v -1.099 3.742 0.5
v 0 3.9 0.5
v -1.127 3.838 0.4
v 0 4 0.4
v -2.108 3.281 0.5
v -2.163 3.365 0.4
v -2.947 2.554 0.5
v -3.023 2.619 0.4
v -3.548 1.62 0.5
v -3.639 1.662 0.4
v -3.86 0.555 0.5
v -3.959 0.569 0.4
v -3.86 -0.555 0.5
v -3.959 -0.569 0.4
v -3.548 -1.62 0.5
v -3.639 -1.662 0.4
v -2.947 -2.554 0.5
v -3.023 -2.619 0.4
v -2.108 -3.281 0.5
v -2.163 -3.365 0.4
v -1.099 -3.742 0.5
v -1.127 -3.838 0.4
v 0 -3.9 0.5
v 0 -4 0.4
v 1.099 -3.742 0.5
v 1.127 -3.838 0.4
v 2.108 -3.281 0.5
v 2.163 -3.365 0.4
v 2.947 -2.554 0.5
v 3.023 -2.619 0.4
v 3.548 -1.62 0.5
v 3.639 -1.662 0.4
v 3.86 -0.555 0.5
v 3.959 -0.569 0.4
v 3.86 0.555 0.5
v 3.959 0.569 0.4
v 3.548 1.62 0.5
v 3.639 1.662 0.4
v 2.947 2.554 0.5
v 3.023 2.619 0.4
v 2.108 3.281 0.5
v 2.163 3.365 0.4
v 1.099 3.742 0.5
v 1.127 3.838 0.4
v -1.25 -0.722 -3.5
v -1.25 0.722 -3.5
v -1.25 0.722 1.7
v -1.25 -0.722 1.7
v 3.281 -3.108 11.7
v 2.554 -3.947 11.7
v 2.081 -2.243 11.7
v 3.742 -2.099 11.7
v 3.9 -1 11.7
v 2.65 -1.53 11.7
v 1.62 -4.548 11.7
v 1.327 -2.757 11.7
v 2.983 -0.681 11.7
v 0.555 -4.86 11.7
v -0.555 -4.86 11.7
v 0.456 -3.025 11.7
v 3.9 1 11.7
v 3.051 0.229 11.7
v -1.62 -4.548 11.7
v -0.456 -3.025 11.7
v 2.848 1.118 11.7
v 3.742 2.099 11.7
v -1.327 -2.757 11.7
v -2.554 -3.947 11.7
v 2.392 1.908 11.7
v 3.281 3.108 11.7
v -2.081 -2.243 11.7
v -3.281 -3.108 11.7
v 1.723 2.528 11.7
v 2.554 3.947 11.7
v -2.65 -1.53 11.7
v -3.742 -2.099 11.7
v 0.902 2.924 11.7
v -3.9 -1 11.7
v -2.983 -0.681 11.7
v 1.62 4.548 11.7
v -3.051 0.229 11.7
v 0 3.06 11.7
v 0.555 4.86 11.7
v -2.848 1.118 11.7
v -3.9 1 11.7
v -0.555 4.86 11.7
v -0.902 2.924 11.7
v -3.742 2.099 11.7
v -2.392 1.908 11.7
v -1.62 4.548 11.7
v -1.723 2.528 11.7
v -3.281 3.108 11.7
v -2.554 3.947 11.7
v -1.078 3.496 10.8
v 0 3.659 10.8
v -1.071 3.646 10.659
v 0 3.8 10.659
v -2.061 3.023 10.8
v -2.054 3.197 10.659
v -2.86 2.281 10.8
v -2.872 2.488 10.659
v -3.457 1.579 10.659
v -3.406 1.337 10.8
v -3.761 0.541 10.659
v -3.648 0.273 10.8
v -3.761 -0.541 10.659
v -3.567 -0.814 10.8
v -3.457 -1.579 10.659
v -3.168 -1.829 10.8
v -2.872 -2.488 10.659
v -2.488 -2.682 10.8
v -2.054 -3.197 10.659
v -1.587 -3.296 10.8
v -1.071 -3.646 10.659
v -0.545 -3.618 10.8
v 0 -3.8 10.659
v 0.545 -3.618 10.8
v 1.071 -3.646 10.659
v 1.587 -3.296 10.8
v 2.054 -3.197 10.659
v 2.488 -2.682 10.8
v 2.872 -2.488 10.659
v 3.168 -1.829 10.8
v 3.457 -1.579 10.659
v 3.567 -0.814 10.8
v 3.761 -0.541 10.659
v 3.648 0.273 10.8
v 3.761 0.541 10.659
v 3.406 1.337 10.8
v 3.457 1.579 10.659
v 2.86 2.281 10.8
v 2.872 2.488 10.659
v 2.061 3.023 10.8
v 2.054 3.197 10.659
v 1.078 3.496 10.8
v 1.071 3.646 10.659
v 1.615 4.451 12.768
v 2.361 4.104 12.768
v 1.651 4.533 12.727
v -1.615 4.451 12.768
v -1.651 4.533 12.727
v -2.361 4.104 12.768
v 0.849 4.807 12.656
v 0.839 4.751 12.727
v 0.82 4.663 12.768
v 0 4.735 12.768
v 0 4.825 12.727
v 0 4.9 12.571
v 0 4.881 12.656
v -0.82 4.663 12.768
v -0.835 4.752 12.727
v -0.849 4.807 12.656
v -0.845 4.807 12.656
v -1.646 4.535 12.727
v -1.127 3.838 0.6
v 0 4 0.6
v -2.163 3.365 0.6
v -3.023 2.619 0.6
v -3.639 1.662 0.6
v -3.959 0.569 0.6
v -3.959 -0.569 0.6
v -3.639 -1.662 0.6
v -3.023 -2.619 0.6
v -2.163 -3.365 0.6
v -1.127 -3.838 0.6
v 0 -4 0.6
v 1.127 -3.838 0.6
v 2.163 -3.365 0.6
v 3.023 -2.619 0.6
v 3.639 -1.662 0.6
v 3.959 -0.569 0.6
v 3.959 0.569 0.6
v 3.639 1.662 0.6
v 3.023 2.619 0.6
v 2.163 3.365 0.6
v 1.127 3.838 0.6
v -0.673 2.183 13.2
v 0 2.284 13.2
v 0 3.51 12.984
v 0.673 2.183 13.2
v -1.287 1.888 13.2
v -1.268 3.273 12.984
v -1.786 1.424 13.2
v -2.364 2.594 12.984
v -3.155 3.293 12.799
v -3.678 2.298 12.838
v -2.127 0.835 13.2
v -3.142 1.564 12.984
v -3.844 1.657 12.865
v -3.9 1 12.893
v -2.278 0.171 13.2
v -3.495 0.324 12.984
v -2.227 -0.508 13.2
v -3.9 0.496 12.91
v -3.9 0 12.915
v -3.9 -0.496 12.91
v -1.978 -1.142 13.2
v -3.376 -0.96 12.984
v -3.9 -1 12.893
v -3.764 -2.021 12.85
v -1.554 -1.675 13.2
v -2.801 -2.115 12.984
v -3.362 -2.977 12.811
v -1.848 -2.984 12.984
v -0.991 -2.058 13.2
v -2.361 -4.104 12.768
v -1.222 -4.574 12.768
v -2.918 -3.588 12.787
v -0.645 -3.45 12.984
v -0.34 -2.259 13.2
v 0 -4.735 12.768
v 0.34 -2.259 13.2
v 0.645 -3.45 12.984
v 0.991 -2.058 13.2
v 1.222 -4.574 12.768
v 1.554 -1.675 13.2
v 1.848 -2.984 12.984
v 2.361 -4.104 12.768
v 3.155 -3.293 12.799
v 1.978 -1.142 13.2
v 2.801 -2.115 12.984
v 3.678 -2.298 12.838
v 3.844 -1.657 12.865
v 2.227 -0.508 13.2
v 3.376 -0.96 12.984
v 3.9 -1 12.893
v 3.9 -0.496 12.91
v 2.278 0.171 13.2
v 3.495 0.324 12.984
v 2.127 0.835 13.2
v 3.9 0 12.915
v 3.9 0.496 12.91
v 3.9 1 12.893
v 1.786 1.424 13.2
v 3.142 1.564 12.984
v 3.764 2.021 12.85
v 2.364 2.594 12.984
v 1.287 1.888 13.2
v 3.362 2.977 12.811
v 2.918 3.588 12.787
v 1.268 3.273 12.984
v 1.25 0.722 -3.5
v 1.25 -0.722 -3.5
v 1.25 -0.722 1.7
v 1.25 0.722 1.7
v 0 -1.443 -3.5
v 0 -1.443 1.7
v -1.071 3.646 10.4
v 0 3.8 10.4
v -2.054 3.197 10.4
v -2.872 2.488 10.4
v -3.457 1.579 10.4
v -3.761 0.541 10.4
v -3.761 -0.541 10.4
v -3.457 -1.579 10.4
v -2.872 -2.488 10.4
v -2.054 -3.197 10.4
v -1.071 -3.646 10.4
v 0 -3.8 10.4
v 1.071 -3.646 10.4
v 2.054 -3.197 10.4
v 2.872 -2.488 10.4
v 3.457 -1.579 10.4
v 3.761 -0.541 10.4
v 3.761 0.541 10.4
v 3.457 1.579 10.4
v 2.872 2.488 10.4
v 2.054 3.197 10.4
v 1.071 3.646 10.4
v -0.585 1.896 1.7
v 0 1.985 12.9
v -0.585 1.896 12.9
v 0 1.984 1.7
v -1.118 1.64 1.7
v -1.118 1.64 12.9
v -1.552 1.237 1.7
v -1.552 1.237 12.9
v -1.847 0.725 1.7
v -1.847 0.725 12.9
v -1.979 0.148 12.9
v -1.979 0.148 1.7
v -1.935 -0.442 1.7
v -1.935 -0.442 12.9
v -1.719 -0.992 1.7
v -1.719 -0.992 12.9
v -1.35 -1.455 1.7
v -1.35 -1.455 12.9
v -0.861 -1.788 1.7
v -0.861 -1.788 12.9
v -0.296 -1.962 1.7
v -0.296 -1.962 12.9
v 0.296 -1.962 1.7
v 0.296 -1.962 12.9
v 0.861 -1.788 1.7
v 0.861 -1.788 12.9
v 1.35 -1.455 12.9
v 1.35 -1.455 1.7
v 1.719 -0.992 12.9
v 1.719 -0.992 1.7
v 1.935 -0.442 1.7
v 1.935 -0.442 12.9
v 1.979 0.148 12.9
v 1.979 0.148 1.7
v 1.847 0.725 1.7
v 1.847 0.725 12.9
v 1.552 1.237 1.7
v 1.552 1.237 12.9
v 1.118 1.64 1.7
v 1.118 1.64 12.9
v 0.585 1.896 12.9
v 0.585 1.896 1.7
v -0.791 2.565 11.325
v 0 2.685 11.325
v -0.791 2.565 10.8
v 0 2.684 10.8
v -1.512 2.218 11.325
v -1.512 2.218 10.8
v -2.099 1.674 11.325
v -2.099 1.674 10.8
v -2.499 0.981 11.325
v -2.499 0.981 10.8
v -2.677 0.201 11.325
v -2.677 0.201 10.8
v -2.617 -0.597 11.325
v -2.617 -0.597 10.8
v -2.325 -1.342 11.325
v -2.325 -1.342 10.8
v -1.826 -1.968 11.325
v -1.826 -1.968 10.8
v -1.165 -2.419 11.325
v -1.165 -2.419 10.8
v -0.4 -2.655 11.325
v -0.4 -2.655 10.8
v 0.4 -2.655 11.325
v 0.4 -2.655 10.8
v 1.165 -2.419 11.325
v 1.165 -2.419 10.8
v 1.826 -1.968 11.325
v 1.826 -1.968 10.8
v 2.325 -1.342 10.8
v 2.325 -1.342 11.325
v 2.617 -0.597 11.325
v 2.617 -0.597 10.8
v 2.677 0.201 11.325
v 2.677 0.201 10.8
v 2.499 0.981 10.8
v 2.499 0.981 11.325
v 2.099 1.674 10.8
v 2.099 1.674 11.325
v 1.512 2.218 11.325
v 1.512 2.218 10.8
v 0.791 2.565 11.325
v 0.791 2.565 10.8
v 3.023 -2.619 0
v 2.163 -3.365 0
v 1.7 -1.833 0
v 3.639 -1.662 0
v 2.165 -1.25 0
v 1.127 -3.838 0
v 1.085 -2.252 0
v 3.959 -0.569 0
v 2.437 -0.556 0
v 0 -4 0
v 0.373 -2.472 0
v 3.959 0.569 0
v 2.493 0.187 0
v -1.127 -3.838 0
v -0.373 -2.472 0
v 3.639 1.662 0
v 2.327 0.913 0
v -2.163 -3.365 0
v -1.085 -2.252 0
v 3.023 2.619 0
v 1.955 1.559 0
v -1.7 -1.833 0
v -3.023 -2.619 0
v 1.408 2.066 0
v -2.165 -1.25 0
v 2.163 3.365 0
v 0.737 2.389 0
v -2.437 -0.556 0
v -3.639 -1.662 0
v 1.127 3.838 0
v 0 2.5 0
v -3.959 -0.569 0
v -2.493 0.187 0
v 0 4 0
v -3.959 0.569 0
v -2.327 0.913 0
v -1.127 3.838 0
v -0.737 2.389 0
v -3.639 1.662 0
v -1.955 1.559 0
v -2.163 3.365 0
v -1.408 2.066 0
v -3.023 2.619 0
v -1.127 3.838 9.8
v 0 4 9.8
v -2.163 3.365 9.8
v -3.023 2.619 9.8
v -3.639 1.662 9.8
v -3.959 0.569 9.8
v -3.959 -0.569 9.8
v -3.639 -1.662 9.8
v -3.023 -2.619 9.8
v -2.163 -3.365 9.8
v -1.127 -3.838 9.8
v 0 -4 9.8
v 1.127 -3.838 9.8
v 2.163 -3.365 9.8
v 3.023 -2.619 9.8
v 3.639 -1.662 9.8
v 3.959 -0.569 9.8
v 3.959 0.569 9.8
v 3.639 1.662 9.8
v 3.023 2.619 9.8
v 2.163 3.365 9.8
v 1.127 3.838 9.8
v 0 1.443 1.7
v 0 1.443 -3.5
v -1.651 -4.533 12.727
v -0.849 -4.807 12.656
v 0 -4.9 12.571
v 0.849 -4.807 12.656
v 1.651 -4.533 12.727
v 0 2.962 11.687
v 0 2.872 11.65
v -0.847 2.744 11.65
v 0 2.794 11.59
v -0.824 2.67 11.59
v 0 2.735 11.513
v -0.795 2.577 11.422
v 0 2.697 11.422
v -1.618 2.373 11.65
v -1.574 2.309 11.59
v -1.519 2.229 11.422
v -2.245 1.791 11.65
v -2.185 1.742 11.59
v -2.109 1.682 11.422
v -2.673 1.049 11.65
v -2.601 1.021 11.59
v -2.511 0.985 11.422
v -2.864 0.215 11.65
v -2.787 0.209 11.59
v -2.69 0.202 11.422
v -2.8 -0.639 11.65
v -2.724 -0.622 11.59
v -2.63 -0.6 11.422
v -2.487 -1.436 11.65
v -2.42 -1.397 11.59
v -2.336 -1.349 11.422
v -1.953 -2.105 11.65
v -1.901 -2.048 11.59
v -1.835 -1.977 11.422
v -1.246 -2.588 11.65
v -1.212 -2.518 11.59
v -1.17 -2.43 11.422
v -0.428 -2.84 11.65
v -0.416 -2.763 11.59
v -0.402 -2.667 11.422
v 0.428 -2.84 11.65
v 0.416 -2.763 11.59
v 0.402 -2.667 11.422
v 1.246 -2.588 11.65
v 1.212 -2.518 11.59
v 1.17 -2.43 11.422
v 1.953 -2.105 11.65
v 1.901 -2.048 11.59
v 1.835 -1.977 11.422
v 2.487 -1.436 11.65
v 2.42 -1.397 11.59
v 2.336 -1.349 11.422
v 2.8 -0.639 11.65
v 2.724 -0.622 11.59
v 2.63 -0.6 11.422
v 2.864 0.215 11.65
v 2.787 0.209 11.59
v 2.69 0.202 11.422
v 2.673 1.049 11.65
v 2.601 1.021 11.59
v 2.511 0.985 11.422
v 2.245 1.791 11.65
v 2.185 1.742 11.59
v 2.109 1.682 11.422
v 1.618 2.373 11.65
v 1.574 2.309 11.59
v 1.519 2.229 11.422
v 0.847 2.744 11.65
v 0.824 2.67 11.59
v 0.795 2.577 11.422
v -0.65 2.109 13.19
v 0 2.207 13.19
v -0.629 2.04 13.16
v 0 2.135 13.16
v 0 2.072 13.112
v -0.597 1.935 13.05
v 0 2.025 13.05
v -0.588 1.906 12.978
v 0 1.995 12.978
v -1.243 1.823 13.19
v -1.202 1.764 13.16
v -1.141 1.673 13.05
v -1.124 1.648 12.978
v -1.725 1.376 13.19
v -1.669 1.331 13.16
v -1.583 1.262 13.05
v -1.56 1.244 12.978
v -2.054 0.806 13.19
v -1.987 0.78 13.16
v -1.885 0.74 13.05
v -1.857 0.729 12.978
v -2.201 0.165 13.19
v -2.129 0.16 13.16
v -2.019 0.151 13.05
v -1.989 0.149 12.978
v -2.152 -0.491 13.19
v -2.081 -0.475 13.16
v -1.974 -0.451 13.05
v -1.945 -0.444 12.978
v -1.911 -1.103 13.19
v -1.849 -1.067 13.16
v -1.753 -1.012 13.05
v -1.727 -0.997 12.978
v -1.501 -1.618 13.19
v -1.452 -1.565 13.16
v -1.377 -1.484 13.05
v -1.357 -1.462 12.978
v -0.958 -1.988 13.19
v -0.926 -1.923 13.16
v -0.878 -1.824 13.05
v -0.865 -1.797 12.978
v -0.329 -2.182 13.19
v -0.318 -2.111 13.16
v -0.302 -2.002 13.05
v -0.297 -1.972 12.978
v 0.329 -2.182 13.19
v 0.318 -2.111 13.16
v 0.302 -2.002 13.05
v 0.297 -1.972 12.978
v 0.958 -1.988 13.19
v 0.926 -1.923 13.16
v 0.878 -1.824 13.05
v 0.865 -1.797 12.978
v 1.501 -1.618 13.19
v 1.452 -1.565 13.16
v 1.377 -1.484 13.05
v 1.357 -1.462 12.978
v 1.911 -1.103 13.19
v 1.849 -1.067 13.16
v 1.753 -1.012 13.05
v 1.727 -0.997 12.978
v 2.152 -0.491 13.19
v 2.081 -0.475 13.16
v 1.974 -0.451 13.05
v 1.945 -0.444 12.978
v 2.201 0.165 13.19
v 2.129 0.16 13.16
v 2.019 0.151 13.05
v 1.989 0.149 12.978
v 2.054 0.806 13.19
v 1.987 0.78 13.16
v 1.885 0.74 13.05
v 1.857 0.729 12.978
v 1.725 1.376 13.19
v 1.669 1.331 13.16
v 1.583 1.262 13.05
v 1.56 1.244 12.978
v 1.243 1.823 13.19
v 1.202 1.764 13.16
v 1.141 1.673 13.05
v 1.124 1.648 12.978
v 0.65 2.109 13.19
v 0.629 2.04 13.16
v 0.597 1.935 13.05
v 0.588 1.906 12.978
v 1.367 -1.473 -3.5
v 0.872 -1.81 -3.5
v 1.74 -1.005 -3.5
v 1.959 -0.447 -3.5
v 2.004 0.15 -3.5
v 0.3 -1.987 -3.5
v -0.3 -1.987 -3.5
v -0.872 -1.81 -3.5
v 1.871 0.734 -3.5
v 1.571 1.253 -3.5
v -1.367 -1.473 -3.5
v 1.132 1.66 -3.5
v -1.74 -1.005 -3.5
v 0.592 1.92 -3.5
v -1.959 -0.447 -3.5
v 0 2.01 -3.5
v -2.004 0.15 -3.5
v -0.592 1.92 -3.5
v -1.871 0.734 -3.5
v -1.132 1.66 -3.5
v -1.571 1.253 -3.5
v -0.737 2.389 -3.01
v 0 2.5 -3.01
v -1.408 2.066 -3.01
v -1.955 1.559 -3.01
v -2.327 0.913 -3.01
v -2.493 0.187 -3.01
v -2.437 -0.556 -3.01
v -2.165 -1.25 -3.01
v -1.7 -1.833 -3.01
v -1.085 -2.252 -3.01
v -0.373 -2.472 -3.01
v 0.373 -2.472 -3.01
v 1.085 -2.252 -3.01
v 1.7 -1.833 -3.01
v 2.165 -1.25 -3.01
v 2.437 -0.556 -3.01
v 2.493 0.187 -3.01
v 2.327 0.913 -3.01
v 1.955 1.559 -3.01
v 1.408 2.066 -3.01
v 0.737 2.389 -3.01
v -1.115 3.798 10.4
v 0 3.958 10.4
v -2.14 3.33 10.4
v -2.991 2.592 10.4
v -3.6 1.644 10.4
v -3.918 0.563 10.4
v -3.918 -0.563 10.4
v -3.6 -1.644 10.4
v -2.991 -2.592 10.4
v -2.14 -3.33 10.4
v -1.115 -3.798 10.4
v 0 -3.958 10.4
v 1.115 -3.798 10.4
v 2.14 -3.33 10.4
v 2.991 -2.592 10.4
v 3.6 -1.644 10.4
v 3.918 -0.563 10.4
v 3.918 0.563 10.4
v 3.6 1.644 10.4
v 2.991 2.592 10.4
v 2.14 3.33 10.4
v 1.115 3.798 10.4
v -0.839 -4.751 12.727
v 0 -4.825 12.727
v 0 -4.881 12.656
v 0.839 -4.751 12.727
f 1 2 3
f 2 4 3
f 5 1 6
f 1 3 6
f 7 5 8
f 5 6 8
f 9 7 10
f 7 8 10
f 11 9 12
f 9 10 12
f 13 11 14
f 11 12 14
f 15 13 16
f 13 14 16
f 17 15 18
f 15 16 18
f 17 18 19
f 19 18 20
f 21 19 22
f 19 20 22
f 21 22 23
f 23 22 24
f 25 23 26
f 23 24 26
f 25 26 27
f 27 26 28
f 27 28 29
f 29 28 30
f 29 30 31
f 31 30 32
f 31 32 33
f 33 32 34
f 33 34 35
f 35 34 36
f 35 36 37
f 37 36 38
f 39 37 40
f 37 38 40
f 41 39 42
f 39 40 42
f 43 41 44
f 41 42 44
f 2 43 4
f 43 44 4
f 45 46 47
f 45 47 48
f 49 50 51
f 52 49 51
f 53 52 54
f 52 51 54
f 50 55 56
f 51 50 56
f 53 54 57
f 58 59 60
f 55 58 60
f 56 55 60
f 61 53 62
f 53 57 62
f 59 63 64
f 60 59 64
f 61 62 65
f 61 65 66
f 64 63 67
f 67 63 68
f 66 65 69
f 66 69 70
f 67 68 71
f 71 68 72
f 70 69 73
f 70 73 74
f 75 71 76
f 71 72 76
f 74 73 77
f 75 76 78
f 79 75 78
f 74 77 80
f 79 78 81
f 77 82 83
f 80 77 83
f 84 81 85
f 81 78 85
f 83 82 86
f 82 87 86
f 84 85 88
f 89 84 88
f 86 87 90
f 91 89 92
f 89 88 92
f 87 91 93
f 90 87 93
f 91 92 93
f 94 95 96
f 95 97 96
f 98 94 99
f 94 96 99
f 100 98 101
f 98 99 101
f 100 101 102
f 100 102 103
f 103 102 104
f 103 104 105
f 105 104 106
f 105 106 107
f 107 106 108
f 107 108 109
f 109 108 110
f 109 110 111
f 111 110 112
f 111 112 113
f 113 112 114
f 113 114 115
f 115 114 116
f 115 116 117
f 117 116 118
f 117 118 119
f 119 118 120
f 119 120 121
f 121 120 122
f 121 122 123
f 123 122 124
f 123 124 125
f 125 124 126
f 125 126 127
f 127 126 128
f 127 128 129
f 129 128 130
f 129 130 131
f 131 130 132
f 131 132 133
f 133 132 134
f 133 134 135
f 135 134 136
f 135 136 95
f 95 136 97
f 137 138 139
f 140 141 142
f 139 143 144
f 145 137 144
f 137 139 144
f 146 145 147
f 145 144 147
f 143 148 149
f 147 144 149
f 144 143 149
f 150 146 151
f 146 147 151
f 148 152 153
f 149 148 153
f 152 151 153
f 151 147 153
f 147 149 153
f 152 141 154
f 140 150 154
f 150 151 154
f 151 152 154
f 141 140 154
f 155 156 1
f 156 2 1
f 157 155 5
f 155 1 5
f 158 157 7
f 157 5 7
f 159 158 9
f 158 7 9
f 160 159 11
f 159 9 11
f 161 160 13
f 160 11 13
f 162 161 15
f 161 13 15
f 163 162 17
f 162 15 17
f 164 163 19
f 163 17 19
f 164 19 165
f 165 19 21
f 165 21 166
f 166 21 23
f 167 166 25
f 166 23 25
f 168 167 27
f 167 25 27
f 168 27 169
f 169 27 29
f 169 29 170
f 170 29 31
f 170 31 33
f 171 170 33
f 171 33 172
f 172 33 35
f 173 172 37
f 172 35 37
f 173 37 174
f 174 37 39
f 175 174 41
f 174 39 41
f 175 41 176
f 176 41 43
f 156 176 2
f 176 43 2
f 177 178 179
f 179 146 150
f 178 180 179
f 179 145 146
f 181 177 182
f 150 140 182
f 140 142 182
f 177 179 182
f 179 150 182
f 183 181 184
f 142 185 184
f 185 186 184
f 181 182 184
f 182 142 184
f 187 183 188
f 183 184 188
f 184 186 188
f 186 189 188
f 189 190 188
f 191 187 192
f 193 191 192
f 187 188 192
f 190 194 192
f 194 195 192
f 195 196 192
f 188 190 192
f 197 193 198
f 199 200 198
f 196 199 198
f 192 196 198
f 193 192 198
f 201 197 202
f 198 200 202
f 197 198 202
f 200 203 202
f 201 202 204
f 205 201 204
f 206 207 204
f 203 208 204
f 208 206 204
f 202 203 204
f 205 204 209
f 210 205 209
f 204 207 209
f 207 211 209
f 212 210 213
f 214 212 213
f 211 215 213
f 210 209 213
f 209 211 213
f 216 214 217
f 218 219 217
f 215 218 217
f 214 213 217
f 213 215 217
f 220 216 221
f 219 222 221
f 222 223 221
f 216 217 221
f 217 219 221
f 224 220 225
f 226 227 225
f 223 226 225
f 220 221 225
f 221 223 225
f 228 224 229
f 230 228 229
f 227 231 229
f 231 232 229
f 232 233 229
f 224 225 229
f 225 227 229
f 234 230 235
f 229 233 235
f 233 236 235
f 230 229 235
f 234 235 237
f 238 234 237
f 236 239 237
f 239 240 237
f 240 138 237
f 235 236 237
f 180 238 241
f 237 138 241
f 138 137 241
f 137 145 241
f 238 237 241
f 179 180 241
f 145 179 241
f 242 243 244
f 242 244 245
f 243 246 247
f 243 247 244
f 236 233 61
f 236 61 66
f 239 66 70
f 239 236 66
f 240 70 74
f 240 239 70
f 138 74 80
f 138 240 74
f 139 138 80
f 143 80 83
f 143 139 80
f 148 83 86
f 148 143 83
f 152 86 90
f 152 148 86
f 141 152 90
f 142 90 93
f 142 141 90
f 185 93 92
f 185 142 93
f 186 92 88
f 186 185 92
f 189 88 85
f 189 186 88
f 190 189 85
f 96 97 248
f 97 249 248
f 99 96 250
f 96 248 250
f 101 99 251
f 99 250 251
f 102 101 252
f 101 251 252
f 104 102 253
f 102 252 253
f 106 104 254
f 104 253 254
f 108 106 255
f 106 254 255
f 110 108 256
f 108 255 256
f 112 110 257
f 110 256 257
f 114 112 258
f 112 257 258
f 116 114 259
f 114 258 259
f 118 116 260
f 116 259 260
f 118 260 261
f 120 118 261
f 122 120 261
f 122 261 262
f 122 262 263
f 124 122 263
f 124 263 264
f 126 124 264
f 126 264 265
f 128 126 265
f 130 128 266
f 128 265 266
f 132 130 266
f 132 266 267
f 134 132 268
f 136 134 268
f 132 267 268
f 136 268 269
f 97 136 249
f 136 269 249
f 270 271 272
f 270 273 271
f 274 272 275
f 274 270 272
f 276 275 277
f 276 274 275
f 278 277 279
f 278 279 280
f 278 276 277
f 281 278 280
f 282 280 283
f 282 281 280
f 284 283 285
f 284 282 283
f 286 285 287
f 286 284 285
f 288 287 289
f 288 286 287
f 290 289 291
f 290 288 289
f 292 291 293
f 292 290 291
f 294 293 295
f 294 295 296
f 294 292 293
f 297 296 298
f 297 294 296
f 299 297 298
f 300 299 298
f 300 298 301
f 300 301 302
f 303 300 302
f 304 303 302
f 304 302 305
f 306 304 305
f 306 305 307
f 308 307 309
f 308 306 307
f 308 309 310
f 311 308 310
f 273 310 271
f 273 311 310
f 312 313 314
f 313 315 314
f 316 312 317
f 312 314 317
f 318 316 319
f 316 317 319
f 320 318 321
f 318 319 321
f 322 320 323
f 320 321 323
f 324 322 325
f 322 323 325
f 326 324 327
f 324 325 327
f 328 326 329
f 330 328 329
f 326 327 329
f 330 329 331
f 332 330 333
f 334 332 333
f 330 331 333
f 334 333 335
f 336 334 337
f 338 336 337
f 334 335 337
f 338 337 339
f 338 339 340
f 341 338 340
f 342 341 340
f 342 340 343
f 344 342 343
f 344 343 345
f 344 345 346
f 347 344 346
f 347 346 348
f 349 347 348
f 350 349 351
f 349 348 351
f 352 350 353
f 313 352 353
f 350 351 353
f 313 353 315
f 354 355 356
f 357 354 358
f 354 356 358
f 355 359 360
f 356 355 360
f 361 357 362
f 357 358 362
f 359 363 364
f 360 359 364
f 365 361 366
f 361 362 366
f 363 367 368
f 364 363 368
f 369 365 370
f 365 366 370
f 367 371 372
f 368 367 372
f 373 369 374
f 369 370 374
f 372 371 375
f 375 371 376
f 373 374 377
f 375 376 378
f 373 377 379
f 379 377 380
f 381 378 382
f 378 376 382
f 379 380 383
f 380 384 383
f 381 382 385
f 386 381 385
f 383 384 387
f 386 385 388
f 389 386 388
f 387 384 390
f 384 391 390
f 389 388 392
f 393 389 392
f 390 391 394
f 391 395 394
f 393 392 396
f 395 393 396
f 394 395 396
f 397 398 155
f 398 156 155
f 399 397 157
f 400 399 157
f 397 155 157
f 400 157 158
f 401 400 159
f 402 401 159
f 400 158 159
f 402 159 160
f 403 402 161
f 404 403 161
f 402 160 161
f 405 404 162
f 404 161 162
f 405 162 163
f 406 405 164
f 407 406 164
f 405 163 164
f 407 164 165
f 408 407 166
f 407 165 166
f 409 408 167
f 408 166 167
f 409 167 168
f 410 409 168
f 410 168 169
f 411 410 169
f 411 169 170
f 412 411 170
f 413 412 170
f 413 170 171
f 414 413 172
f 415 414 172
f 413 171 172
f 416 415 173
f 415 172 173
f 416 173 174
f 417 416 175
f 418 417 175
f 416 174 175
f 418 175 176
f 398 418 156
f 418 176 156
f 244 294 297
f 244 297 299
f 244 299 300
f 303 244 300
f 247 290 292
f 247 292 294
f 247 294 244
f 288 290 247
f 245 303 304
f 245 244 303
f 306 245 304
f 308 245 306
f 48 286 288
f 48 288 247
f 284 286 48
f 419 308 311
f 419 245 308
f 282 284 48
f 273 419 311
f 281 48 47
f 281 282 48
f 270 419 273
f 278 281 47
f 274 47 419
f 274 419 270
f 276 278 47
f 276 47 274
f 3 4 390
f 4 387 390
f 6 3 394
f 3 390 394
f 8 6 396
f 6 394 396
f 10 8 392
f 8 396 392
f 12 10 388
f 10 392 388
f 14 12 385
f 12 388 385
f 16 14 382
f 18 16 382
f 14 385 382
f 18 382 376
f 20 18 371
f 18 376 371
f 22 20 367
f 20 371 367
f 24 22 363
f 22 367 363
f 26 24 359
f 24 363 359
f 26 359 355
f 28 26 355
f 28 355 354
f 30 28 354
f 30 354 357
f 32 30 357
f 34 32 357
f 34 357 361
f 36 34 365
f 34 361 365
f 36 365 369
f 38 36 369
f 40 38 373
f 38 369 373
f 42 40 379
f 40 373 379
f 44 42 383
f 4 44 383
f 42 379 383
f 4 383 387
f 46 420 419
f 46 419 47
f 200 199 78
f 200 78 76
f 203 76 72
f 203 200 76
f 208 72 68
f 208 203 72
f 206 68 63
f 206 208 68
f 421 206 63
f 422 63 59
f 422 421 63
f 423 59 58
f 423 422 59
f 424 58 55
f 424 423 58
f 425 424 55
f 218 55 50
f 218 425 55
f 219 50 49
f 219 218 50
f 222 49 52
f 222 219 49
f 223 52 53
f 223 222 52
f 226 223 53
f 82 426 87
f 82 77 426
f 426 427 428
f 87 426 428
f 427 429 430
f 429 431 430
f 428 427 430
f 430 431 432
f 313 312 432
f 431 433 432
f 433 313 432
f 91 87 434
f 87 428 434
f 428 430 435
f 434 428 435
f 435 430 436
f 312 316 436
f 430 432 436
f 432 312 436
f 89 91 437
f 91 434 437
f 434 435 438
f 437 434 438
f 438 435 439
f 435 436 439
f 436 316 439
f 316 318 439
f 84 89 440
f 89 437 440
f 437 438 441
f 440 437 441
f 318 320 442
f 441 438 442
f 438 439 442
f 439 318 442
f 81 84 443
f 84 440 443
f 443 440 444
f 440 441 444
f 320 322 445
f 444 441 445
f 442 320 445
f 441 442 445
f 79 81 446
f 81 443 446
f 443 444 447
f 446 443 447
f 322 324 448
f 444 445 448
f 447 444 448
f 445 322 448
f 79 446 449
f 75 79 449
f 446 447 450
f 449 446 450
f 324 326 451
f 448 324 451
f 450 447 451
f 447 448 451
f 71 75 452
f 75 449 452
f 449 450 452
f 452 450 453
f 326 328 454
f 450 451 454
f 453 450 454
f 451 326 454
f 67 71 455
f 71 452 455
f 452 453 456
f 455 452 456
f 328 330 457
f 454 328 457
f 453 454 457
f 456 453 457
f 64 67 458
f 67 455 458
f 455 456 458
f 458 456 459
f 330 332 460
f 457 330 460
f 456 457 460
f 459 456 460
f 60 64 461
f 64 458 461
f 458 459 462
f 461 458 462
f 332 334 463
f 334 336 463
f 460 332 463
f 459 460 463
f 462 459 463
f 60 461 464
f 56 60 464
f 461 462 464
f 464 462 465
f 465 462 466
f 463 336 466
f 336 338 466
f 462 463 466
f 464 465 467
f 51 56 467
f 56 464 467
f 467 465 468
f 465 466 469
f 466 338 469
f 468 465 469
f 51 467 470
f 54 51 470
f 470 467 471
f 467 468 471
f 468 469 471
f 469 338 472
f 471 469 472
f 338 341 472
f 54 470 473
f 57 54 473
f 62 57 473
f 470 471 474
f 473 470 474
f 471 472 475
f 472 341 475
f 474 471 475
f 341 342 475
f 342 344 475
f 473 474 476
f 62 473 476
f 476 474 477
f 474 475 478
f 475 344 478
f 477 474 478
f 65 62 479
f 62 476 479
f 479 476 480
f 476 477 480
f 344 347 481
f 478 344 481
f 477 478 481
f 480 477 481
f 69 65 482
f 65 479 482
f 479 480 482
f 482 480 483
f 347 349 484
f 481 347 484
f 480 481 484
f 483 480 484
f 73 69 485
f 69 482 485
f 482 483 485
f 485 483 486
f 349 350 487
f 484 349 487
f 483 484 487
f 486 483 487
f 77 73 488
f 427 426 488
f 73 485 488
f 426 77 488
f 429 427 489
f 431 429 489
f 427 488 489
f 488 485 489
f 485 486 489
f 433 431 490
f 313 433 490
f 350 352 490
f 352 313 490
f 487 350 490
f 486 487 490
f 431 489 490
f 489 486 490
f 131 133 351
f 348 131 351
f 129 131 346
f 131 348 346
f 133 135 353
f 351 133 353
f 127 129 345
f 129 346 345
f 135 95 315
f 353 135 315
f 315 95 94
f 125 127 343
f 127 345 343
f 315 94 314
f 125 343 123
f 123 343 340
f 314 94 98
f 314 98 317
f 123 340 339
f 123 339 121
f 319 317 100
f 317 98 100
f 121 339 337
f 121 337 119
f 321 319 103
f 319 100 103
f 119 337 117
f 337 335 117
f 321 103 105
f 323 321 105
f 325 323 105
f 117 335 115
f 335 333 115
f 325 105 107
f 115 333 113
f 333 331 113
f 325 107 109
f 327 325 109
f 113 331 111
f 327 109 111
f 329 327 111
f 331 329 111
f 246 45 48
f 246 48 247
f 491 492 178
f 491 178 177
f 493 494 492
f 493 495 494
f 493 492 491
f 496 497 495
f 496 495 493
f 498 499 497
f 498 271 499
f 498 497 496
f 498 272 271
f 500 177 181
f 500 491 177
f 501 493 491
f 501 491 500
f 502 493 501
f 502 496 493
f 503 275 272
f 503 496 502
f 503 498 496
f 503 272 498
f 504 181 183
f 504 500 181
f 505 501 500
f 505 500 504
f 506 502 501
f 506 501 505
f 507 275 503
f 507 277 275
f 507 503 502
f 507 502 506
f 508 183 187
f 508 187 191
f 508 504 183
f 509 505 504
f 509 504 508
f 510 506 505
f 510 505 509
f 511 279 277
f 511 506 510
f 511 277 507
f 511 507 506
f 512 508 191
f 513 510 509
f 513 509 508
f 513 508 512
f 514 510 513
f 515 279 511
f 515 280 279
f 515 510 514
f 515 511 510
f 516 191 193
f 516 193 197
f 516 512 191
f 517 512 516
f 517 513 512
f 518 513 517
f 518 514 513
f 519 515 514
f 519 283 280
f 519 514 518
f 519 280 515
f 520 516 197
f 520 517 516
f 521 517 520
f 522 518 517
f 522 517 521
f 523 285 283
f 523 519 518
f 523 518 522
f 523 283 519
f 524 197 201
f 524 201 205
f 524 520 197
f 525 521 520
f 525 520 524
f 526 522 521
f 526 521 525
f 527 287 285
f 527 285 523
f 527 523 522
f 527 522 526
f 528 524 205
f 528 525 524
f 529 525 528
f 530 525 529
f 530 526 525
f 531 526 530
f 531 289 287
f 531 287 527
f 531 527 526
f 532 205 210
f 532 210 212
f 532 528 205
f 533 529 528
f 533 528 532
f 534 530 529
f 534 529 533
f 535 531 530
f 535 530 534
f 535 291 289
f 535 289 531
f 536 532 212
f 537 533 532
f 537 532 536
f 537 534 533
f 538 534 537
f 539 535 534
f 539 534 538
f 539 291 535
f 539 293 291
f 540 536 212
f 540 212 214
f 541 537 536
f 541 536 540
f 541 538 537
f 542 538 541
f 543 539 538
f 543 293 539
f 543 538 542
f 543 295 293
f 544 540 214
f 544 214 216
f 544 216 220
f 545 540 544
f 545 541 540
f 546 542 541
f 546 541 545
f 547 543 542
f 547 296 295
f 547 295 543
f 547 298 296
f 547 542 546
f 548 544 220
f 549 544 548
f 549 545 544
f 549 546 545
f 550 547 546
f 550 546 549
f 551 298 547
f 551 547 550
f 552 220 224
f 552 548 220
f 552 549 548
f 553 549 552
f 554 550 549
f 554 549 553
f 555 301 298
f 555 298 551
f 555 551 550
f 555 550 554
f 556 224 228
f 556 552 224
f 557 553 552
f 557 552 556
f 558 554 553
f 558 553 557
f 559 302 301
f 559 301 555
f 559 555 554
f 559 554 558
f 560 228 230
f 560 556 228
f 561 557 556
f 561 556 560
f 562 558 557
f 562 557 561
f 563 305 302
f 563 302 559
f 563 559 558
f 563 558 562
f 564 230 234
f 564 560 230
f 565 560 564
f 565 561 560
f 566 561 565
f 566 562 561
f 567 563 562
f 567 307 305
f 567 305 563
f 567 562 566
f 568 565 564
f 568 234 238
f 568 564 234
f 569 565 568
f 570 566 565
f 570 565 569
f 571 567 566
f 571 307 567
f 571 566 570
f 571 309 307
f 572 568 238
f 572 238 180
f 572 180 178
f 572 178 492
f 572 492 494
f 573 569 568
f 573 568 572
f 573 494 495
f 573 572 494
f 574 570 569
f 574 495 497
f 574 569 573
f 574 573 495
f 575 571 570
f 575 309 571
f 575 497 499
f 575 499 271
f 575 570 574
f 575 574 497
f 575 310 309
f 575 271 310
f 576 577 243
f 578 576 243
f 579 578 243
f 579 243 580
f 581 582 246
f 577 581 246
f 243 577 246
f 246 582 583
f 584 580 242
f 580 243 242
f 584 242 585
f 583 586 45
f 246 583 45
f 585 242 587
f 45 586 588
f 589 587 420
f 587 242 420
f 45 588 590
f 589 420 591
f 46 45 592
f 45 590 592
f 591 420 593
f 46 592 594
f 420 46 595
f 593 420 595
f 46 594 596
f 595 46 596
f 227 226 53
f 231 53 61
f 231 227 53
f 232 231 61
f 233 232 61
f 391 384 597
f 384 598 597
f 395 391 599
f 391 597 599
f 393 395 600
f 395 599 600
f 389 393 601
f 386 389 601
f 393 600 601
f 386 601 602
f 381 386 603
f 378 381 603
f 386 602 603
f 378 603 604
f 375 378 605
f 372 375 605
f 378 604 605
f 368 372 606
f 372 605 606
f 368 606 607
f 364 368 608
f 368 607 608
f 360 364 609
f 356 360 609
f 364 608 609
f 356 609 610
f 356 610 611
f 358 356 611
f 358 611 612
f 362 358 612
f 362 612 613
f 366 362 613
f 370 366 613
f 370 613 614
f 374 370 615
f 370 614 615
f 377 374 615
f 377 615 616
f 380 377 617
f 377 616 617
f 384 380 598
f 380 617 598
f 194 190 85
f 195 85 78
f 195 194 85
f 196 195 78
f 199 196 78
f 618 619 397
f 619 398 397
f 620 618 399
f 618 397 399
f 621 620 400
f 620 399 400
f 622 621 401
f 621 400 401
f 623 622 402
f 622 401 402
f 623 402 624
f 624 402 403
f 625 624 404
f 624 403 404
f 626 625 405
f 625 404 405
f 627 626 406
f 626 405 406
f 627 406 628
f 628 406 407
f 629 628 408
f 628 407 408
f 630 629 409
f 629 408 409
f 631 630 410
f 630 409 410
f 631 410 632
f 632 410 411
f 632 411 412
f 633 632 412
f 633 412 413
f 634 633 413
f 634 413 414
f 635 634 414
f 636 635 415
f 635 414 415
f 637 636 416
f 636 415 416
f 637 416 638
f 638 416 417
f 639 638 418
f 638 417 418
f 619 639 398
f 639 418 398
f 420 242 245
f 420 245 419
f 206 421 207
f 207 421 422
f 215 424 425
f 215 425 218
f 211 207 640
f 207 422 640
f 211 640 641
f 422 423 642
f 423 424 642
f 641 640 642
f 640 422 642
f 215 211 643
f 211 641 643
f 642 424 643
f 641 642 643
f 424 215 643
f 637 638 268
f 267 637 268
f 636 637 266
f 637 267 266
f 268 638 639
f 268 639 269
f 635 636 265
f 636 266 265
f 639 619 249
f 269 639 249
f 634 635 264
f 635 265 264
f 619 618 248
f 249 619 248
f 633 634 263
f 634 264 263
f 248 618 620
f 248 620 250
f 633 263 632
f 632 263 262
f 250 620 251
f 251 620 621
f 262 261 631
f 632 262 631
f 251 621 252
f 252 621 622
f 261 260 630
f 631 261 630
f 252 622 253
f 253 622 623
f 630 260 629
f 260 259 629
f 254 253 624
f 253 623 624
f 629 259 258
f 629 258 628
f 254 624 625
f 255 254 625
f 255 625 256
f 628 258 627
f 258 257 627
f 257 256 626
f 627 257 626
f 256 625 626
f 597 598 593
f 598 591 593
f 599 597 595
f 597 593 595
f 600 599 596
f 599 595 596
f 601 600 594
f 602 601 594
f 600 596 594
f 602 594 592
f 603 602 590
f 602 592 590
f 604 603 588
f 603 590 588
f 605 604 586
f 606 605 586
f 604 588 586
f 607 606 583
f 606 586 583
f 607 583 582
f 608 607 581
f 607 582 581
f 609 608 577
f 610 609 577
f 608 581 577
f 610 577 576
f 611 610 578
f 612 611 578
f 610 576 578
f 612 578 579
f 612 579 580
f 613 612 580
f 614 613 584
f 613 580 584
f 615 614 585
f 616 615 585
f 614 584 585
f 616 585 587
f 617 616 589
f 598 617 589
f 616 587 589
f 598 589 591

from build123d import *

# Parameters (mm, degrees)
SKETCH2_W          = 19.6
SKETCH2_H          = 19.6
CUT_EXTRUDE1_DEPTH = 1.5
CUT_EXTRUDE2_DEPTH = 5.2


with BuildPart() as part:
    # Sketch1 → Revolve1 (revolve)
    with BuildSketch(Plane(origin=(0, 0, 0), x_dir=(0, 0, -1), z_dir=(1, 0, 0))):
        with BuildLine():
            Line((-13.2, 0), (-13.2, 2.2845))
            Line((-13.2, 2.2845), (-12.767958406, 4.734729636))
            ThreePointArc((-12.767958406, 4.734729636), (-12.699554378, 4.853208889), (-12.570996856, 4.9))
            Line((-12.570996856, 4.9), (-11.7, 4.9))
            Line((-11.7, 4.9), (-11.7, 3.0595))
            ThreePointArc((-11.7, 3.0595), (-11.590165043, 2.794334957), (-11.325, 2.6845))
            Line((-11.325, 2.6845), (-10.8, 2.6845))
            Line((-10.8, 2.6845), (-10.8, 3.658578644))
            Line((-10.8, 3.658578644), (-10.658578644, 3.8))
            Line((-10.658578644, 3.8), (-10.4, 3.8))
            Line((-10.4, 3.8), (-10.4, 3.958043913))
            Line((-10.4, 3.958043913), (-9.8, 4))
            Line((-9.8, 4), (-0.6, 4))
            Line((-0.6, 4), (-0.5, 3.9))
            Line((-0.5, 3.9), (-0.4, 4))
            Line((-0.4, 4), (0, 4))
            Line((0, 4), (0, 2.5))
            Line((0, 2.5), (3.0095, 2.5))
            Line((3.0095, 2.5), (3.5, 2.0095))
            Line((3.5, 2.0095), (3.5, 0))
            Line((3.5, 0), (-13.2, 0))
        make_face()
    revolve(axis=Axis((0, 0, -3.5), (0, 0, 1)))

    # Sketch2 → Cut-Extrude1 (cut)
    with BuildSketch(Plane.XY.offset(13.2)):
        Rectangle(SKETCH2_W, SKETCH2_H)
        with BuildLine():
            Line((-3.9, 1), (-3.9, -1))
            ThreePointArc((-3.9, -1), (0, -4.9), (3.9, -1))
            Line((3.9, -1), (3.9, 1))
            ThreePointArc((3.9, 1), (0, 4.9), (-3.9, 1))
        make_face(mode=Mode.SUBTRACT)
    extrude(amount=-CUT_EXTRUDE1_DEPTH, mode=Mode.SUBTRACT)

    # Sketch3 → Cut-Extrude2 (cut)
    with BuildSketch(Plane.XY.offset(-3.5)):
        Polygon((-1.25, -0.721687836), (0, -1.443375673), (1.25, -0.721687836), (1.25, 0.721687836), (0, 1.443375673), (-1.25, 0.721687836), align=None)
    extrude(amount=CUT_EXTRUDE2_DEPTH, mode=Mode.SUBTRACT)

    # Sketch4 → Cut-Revolve1 (revolve, cut)
    with BuildSketch(Plane(origin=(0, 0, 0), x_dir=(0, 0, -1), z_dir=(1, 0, 0))):
        with BuildLine():
            Line((-13.2, 0), (-13.2, 2.2845))
            ThreePointArc((-13.2, 2.2845), (-13.112132034, 2.072367966), (-12.9, 1.9845))
            Line((-12.9, 1.9845), (-1.7, 1.9845))
            Line((-1.7, 1.9845), (-1.7, 0))
            Line((-1.7, 0), (-13.2, 0))
        make_face()
    revolve(axis=Axis((0, 0, 1.7), (0, 0, 1)), mode=Mode.SUBTRACT)


solid = part.part
